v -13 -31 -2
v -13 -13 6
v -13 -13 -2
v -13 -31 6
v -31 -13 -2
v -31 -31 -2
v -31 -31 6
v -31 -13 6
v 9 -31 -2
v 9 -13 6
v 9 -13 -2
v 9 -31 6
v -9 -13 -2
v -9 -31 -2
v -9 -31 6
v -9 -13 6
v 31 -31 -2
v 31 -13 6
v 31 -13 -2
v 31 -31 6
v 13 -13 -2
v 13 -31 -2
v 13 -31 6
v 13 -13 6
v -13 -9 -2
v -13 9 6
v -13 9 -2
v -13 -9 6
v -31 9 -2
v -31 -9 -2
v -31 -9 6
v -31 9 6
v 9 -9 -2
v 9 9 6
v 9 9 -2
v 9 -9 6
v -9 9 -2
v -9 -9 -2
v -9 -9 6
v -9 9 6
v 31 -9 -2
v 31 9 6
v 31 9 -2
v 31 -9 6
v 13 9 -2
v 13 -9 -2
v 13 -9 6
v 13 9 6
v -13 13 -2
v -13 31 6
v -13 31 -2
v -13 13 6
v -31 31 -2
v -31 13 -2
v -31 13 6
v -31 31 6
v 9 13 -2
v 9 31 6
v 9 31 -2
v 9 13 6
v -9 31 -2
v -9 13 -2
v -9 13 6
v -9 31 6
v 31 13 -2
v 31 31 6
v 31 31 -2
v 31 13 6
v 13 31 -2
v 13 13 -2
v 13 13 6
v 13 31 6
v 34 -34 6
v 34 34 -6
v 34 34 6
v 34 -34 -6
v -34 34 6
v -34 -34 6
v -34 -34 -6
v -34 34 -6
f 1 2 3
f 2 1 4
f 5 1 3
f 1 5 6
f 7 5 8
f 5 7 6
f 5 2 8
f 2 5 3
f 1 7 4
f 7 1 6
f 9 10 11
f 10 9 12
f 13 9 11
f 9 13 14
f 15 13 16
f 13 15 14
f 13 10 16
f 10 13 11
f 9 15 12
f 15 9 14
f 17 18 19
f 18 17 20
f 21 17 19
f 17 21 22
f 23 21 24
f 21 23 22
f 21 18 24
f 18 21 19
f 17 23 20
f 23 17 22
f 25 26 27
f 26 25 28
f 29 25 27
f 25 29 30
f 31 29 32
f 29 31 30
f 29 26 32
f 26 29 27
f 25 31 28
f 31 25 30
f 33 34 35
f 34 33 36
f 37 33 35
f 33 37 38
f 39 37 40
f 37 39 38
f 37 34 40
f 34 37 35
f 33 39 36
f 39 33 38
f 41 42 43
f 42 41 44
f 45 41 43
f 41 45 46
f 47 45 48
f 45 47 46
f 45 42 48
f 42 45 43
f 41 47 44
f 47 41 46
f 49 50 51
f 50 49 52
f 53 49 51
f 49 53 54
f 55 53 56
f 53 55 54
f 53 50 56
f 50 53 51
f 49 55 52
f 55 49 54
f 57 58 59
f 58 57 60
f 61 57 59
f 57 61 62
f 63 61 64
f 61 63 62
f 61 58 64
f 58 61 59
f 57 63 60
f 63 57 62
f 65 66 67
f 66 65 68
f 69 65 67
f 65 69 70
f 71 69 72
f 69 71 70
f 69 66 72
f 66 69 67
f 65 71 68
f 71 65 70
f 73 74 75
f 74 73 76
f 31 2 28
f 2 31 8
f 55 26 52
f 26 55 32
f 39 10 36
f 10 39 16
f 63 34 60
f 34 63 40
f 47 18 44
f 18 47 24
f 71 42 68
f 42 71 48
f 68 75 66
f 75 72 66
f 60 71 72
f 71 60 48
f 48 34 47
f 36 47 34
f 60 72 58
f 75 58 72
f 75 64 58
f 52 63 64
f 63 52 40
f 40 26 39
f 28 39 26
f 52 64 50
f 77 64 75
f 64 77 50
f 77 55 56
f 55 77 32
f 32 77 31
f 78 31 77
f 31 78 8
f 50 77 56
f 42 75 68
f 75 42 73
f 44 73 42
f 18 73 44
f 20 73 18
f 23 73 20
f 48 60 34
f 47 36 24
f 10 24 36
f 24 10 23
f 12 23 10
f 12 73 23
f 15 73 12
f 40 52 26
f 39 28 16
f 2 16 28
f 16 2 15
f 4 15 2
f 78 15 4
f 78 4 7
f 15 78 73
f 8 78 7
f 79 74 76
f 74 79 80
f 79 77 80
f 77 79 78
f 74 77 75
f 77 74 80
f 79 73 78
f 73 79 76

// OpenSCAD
$fn = 32;

// ----------------------------------------------------------------------
// Pocket plate 68 x 68 x 12
// 3 x 3 pockets 18 mm square, 8 mm deep
// ----------------------------------------------------------------------

// --- parameters (mm) ---
thickness = 12;  // plate thickness
floor_t = 4;     // material left under each pocket
pocket = 18;     // pocket side length
pitch_x = 22;    // pocket pitch along X
pitch_y = 22;    // pocket pitch along Y
cols = 3;        // pockets per row
rows = 3;        // rows of pockets

// --- derived feature positions (mm) ---
depth = thickness - floor_t;        // = 8   pocket depth, down to the floor
span_x = (cols - 1) * pitch_x;      // = 44   distance between outer pockets
span_y = (rows - 1) * pitch_y;      // = 44   distance between outer pocket rows
origin_x = -span_x / 2;             // = -22   X of the first pocket
origin_y = -span_y / 2;             // = -22   Y of the first pocket
plate = [span_x + pocket + 6, span_y + pocket + 6, thickness];  // = [68, 68, 12]   overall size: pockets plus 3 mm of wall on each side
feature_centers = [
  [origin_x + 0 * pitch_x, origin_y + 0 * pitch_y],
  [origin_x + 1 * pitch_x, origin_y + 0 * pitch_y],
  [origin_x + 2 * pitch_x, origin_y + 0 * pitch_y],
  [origin_x + 0 * pitch_x, origin_y + 1 * pitch_y],
  [origin_x + 1 * pitch_x, origin_y + 1 * pitch_y],
  [origin_x + 2 * pitch_x, origin_y + 1 * pitch_y],
  [origin_x + 0 * pitch_x, origin_y + 2 * pitch_y],
  [origin_x + 1 * pitch_x, origin_y + 2 * pitch_y],
  [origin_x + 2 * pitch_x, origin_y + 2 * pitch_y]
];   // pocket centres, used verbatim by the cutter loop

// plate outline, then one pocket per centre in feature_centers
difference() {
  cube(plate, center = true);
  for (centre = feature_centers)
    translate([centre[0] - pocket / 2, centre[1] - pocket / 2, plate[2] / 2 - depth])
      cube([pocket, pocket, depth + 1]);  // centred on the declared pocket centre
}
